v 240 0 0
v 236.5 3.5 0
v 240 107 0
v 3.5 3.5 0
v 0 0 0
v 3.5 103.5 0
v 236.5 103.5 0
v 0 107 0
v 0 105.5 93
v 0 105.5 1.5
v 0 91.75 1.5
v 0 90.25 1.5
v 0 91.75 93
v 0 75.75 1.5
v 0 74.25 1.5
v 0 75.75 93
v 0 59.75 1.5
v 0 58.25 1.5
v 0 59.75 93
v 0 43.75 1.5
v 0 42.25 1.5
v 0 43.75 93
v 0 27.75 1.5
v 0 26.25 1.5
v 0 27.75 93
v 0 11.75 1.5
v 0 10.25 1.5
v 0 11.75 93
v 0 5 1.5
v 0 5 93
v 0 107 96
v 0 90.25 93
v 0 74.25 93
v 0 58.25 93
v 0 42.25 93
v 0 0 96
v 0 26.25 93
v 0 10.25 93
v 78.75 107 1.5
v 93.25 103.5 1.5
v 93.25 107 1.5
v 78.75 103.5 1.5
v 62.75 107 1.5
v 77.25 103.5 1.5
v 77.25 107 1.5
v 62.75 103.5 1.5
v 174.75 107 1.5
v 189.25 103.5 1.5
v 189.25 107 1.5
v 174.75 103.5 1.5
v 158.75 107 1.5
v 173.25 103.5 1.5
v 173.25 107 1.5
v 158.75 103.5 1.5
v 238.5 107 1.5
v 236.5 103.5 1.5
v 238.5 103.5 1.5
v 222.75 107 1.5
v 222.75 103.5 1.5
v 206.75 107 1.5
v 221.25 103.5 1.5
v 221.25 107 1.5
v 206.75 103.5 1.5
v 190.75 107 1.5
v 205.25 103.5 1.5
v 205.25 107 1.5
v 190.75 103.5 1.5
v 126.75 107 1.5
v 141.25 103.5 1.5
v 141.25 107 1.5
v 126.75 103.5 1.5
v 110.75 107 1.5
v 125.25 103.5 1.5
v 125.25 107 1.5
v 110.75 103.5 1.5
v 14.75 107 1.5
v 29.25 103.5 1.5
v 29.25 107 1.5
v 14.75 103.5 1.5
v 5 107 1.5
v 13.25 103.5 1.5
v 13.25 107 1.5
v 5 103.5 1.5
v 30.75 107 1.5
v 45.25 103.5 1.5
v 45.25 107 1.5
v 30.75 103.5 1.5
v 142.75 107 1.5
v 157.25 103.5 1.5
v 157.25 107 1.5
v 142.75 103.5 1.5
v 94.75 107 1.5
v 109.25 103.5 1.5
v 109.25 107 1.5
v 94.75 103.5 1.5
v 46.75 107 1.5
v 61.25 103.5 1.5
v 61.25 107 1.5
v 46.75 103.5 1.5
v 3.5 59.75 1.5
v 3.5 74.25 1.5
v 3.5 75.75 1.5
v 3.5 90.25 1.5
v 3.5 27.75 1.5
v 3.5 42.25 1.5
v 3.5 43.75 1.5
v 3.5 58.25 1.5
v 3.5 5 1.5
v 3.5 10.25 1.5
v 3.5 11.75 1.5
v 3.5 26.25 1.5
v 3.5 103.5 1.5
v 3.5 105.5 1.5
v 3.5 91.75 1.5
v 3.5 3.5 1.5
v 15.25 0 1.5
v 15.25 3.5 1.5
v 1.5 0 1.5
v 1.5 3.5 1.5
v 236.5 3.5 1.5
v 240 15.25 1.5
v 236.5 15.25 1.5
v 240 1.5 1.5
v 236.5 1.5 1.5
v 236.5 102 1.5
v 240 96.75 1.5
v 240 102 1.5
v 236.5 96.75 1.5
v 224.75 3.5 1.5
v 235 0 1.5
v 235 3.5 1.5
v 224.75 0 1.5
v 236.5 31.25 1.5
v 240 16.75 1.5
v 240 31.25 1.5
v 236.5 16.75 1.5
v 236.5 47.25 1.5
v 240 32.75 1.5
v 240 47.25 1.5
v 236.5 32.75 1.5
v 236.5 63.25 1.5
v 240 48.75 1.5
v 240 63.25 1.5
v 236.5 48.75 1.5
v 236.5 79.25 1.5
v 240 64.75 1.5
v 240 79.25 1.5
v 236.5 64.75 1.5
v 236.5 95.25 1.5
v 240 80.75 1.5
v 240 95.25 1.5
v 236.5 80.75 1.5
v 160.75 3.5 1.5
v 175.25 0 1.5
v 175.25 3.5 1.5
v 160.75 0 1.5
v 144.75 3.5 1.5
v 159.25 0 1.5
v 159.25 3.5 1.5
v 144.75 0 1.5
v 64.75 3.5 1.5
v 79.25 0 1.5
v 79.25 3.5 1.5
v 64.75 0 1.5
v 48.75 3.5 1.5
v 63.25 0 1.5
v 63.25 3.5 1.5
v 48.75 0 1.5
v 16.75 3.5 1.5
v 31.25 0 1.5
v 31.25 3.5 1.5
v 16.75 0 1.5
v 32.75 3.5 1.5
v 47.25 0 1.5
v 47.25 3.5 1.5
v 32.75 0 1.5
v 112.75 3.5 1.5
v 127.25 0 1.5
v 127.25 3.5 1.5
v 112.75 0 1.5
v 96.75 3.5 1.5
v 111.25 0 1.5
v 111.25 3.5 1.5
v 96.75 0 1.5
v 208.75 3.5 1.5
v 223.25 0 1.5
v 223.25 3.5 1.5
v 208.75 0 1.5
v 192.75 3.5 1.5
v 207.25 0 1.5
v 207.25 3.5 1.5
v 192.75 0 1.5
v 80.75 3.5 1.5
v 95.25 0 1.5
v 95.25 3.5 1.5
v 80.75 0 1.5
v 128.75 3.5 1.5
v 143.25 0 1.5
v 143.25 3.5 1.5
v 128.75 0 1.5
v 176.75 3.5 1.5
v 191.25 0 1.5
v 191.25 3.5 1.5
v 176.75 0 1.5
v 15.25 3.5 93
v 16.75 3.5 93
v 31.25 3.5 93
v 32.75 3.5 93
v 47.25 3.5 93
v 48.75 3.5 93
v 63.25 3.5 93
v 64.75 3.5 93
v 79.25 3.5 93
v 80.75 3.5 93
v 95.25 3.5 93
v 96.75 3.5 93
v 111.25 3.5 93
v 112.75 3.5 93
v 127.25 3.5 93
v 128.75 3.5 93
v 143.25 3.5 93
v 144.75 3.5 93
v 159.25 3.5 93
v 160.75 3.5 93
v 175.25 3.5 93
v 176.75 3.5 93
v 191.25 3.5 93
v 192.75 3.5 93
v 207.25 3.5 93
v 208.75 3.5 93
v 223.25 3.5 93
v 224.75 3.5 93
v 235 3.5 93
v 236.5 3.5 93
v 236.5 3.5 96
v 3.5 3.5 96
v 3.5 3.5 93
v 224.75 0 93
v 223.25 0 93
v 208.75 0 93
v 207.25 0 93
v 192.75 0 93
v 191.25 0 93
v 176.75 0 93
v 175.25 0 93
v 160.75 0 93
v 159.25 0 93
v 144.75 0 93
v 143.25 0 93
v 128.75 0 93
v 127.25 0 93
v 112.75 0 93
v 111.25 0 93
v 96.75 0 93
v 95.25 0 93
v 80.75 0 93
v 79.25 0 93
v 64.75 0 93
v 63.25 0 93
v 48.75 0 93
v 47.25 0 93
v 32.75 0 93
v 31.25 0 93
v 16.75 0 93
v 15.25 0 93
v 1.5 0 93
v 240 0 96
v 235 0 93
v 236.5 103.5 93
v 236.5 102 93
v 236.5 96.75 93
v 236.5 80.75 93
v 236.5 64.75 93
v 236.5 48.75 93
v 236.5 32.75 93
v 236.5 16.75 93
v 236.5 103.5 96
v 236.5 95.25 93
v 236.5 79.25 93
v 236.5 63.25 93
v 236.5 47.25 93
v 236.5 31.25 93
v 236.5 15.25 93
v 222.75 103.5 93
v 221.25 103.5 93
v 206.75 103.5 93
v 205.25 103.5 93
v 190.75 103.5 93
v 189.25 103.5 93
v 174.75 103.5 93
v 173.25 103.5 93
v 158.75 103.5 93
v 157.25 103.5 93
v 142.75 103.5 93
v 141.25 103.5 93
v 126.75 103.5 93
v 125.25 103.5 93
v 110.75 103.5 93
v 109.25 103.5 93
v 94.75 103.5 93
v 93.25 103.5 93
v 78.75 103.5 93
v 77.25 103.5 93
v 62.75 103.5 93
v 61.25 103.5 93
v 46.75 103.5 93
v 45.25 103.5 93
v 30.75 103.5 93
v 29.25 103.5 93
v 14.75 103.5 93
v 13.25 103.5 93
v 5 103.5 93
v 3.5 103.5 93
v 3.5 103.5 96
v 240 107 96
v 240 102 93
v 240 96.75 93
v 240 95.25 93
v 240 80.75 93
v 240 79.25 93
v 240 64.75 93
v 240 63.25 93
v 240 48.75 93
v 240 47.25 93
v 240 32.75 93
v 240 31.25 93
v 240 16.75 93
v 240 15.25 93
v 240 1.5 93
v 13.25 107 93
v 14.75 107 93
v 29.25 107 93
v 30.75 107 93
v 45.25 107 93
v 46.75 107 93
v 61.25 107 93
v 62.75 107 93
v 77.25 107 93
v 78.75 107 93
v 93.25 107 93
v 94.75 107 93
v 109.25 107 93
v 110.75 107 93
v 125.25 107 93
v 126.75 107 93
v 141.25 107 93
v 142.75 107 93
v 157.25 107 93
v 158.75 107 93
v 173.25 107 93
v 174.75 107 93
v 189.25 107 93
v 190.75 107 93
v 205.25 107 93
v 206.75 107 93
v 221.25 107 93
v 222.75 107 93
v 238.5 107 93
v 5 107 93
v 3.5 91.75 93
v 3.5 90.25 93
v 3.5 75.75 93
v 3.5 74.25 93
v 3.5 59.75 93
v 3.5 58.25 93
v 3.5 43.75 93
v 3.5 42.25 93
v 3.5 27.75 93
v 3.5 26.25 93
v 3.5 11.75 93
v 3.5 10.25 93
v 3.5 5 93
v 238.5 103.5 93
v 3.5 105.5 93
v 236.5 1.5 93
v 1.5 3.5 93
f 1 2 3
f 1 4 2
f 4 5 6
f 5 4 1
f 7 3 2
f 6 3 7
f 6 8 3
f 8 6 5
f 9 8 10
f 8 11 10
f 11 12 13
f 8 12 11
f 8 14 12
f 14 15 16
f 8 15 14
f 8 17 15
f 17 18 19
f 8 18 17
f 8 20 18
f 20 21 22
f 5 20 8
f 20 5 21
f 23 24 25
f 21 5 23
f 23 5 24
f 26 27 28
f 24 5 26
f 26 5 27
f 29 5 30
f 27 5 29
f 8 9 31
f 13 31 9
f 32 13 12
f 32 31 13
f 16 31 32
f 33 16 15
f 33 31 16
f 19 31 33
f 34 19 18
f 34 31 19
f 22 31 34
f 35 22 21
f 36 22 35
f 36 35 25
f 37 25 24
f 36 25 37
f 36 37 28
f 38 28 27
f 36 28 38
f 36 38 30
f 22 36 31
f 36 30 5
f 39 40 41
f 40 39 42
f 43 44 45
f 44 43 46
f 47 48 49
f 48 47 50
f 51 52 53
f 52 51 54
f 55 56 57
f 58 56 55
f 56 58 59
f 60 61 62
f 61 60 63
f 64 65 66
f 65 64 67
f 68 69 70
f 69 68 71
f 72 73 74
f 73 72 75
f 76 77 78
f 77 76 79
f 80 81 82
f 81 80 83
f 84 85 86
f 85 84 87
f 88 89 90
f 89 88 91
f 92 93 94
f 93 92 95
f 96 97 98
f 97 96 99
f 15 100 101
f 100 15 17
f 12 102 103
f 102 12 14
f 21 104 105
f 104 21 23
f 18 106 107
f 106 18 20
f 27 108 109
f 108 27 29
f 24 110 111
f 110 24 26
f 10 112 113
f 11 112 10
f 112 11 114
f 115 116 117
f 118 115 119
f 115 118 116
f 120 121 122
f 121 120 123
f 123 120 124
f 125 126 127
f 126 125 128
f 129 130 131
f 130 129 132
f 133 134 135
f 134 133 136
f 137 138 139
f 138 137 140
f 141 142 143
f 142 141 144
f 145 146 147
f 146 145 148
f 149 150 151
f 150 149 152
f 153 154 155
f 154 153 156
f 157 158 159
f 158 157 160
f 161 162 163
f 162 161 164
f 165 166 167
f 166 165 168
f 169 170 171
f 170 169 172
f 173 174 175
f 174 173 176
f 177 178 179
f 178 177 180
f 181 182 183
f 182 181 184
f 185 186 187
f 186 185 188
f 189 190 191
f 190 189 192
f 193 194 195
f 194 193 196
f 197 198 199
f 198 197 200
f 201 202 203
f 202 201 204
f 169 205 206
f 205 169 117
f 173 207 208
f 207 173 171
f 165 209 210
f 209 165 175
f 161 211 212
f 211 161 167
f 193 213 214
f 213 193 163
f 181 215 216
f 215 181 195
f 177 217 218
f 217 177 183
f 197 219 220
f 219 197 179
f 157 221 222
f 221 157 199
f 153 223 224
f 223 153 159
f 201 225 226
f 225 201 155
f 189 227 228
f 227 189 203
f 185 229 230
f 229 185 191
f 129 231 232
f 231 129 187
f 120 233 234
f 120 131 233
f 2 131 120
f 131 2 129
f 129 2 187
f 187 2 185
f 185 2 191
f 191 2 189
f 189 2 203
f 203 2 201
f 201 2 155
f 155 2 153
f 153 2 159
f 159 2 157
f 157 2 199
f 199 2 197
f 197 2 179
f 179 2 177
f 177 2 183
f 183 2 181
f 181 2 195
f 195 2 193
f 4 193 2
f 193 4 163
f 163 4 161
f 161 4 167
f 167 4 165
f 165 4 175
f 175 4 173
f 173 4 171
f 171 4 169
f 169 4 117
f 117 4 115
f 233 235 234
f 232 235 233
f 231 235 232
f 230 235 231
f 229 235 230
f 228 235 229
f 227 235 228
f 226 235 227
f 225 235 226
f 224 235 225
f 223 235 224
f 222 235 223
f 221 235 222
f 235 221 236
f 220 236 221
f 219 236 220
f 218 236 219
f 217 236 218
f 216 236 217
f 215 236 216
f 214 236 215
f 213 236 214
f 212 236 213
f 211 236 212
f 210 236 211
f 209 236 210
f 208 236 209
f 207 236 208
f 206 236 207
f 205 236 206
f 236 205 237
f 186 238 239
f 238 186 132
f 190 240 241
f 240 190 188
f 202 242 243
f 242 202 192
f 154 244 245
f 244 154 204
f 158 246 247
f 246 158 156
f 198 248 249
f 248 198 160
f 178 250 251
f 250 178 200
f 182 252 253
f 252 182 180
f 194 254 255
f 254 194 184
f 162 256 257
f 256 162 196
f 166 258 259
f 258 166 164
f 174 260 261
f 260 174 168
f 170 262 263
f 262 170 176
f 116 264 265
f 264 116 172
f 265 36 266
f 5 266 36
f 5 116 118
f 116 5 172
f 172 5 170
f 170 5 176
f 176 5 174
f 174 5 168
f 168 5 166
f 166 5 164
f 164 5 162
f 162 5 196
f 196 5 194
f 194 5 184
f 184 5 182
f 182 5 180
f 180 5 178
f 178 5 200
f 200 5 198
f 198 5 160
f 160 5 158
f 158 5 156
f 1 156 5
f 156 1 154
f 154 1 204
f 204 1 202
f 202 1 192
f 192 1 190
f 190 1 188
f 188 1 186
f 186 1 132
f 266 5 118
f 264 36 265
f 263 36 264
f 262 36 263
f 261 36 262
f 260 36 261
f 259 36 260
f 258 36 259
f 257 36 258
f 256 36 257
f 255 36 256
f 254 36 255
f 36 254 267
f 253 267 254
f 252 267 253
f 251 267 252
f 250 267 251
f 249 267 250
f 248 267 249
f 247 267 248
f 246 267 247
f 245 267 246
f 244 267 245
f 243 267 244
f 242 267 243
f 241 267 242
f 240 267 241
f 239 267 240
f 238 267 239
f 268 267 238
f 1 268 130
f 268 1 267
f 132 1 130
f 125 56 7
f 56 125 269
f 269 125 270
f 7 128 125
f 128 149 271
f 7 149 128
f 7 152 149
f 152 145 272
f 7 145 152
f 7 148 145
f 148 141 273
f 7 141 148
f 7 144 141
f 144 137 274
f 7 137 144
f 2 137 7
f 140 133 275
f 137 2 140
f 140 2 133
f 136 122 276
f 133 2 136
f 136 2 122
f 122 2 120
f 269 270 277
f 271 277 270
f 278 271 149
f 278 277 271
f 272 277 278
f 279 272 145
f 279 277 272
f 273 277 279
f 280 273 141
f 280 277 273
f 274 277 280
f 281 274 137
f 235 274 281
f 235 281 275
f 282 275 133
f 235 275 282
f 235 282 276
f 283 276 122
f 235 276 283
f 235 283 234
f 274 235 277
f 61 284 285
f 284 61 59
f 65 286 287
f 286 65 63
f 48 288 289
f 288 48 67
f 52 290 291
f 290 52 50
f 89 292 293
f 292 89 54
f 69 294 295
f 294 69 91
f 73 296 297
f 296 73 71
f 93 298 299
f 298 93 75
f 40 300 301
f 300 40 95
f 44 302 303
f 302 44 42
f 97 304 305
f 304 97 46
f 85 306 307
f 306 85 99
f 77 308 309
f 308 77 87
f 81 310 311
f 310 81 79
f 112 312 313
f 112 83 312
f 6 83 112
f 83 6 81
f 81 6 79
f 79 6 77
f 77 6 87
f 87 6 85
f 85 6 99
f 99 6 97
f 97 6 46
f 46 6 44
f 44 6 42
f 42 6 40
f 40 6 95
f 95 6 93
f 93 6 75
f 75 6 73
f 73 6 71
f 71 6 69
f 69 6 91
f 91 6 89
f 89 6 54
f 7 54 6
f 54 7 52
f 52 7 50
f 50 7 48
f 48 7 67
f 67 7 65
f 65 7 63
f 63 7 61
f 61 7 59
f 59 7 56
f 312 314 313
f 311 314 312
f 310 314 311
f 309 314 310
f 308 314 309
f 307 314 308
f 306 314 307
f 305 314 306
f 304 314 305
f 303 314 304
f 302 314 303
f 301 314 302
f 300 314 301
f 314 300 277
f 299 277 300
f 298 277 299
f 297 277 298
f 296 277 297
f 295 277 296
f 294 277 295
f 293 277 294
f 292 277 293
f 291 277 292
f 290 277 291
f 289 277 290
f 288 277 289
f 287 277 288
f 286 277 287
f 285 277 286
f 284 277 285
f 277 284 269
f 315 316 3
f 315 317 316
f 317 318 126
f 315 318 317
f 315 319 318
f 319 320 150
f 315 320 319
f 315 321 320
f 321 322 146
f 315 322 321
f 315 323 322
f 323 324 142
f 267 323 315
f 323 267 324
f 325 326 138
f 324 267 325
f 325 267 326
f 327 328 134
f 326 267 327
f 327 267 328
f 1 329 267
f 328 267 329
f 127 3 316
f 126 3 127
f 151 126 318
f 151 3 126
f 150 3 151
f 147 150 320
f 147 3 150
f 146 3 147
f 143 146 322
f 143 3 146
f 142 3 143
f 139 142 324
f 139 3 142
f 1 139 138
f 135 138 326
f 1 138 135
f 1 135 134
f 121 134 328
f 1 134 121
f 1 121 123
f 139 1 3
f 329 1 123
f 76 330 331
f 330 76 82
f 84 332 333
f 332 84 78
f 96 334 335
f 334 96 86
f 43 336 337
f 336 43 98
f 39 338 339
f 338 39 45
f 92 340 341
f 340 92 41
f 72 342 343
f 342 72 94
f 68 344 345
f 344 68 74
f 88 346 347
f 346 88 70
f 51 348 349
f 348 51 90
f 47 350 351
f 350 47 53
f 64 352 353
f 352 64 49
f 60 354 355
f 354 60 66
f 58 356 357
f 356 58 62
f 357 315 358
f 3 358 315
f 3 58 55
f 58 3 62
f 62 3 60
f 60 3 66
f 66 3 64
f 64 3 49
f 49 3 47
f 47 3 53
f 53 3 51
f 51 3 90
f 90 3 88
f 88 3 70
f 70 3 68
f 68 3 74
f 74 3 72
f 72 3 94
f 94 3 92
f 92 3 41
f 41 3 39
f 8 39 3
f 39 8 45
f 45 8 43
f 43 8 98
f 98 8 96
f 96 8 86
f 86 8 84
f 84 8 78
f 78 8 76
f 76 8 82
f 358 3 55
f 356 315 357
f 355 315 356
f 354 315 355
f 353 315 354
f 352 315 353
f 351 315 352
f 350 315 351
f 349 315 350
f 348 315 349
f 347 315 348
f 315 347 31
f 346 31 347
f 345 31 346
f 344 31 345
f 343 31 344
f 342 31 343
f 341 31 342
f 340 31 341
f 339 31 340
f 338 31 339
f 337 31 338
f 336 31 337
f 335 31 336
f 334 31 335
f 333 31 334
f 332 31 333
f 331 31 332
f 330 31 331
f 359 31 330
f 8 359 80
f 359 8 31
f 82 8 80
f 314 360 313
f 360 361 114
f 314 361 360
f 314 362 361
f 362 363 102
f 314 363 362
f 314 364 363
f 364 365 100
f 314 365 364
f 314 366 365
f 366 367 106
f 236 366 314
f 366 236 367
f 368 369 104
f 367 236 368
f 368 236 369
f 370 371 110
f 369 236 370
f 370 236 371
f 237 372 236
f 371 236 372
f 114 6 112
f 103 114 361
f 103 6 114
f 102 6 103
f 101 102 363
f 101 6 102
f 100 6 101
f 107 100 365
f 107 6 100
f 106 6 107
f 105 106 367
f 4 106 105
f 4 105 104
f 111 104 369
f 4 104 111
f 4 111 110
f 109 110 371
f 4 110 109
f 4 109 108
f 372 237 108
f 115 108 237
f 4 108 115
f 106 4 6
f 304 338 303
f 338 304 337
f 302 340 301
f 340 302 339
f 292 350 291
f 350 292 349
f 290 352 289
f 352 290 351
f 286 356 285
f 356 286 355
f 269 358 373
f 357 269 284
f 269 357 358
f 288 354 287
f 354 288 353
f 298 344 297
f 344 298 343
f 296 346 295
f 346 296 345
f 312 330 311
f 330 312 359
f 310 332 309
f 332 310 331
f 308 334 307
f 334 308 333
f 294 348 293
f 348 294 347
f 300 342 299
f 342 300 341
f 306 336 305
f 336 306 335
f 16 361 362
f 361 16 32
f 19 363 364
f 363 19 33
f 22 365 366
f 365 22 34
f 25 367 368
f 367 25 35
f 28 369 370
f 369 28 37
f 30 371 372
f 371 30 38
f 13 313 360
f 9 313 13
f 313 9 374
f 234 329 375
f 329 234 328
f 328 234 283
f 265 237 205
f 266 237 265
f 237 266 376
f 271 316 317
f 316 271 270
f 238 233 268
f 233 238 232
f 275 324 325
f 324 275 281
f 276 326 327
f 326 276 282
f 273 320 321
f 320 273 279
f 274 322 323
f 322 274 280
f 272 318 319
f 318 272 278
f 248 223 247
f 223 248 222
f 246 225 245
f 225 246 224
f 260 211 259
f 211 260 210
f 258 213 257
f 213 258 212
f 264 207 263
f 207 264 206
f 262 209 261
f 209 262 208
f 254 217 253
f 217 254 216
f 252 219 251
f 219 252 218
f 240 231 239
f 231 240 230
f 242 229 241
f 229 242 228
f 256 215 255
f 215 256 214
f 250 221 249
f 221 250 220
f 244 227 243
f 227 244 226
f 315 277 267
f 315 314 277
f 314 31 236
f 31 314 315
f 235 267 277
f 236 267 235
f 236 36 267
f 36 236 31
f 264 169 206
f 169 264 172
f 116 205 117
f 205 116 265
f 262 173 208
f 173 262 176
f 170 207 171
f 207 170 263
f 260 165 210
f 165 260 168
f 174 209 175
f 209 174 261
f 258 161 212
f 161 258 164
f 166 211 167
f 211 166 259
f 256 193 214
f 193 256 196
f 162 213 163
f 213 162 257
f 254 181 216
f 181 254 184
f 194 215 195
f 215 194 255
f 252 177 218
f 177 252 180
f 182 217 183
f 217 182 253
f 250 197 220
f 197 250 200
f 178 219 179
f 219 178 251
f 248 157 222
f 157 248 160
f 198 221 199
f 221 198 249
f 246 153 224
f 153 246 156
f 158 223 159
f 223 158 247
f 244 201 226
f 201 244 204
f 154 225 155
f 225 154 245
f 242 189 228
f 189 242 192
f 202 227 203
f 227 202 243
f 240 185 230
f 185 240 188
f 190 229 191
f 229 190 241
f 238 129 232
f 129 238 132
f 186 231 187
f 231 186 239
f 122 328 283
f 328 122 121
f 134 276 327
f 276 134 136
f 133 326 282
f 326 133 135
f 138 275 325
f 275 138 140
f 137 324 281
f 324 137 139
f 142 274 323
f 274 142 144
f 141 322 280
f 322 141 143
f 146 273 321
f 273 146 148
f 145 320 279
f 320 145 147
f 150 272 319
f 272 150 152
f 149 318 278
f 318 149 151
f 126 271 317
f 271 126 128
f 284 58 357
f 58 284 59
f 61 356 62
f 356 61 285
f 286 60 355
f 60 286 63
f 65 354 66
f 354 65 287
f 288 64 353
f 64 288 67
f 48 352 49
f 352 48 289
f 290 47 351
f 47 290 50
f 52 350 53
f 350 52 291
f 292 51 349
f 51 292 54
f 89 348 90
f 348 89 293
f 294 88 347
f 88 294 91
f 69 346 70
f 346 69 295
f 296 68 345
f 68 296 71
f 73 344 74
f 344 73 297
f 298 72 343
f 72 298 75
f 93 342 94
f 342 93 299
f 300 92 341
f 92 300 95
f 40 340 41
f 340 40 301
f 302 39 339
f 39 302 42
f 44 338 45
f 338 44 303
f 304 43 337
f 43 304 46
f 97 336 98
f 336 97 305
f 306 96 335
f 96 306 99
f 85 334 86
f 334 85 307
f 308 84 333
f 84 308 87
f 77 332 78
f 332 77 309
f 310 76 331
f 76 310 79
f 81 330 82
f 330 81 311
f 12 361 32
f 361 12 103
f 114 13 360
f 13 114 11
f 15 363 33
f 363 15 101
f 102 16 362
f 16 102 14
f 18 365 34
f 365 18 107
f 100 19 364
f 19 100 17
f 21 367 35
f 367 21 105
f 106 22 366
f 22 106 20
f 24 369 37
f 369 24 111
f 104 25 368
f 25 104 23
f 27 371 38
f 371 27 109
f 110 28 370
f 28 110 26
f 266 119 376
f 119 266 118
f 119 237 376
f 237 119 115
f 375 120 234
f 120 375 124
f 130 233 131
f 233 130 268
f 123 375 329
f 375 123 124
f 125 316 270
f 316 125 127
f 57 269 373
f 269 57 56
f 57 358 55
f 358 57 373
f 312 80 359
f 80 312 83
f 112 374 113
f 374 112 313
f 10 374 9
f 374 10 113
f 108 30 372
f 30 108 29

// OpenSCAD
// file: lumber.scad
use <utilities.scad>;

// Stick
module stick_2x4x8(cut = [0, 0, 0]) {
  echo("stick_2x4x8");
  cube([inches(1, 1 / 2) - cut[0], inches(3, 1 / 2) - cut[1], feet(8) - cut[2]]);
}
;

module stick_2x6x8(cut = [0, 0, 0]) {
  echo("stick_2x6x8");
  cube([inches(1, 1 / 2) - cut[0], inches(5, 1 / 2) - cut[1], feet(8) - cut[2]]);
}
;

// Sheet
module stick_4x8x1_2(cut = [0, 0, 0]) {
  echo("4x8x1/2");
  cube([feet(4) - cut[0], feet(8) - cut[1], inches(0, 1 / 2) - cut[2]]);
}
;

module stick_4x8x3_4(cut = [0, 0, 0]) {
  echo("4x8x3/4");
  cube([feet(4) - cut[0], feet(8) - cut[1], inches(0, 3 / 4) - cut[2]]);
}
;

stick_2x4x8();

translate([24, 0, 0])
  stick_2x6x8();

translate([48, 0, 0])
  stick_4x8x1_2();

translate([120, 0, 0])
  stick_4x8x3_4();
// file: utilities.scad
function feet(f) = f * 12;
function inches(i = 0, f = 0) = i + f;
// main file
use <utilities.scad>;
use <lumber.scad>;

module frame_walls(start_height = 0, wall_height = feet(8), width = feet(20), depth = feet(8) + inches(11)) {
  stud_cut_length = feet(8) - wall_height + inches(4, 1 / 2);
  assert(stud_cut_length > -0.00000000001, "Your wall height has exceeded your lumber length");

  for (a = [0:1]) {
    // Top and Bottom Plate
    // South Plates
    for (b = [0:feet(8):width]) {
      trim = b + feet(8) > width ? [0, 0, b + feet(8) - width + inches(3, 1 / 2)] : [0, 0, 0];

      translate([b, 0, inches(1, 1 / 2) + start_height + a * (wall_height - inches(3))])
        rotate(a=[0, 90, 0])
          stick_2x4x8(cut=trim);
    }

    // Add a second top plate
    if (a == 1) {
      for (b = [width:-feet(8):0]) {
        echo("b:", b); trim = b < feet(8) ? [0, 0, feet(8) - b + inches(3, 1 / 2)] : [0, 0, 0];

        translate([b - feet(8) + trim[2], 0, a * wall_height + start_height])
          rotate(a=[0, 90, 0])
            stick_2x4x8(cut=trim);
      }
    }

    // East Plates
    for (b = [0:feet(8):depth]) {
      // near to far
      translate([width, 0, inches(1, 1 / 2) + start_height + a * (wall_height - inches(3))])
        rotate(a=[270, 90, 0])
          stick_2x4x8(cut=[0, 0, feet(8) - depth + inches(3, 1 / 2)]);
    }

    // Add a second top plate
    if (a == 1) {
      for (b = [0:feet(8):depth]) {
        // near to far
        translate([width, inches(3, 1 / 2), a * wall_height + start_height])
          rotate(a=[270, 90, 0])
            stick_2x4x8(cut=[0, 0, feet(8) - depth + inches(3, 1 / 2)]);
      }
    }

    // North Plates
    for (b = [width:-feet(8):0]) {
      // Right to left
      trim = b < feet(8) ? [0, 0, feet(8) - b + 3.5] : [0, 0, 0];

      translate([b, depth - inches(3, 1 / 2), a * (wall_height - inches(3))])
        rotate(a=[0, 270, 0])
          stick_2x4x8(cut=trim);
    }

    // Add a second top plate
    if (a == 1) {
      for (b = [0:feet(8):width]) {
        // Right to left
        trim = width - b < feet(8) ? [0, 0, feet(8) - (width - b) + inches(3, 1 / 2)] : [0, 0, 0];

        translate([b, depth - inches(3, 1 / 2), a * wall_height + start_height])
          rotate(a=[0, 90, 0])
            stick_2x4x8(cut=trim);
      }
    }

    // West Plates
    for (b = [0:feet(8):depth]) {
      // near to far
      translate([0, depth, inches(1, 1 / 2) + start_height + a * (wall_height - inches(3))])
        rotate(a=[90, 90, 0])
          stick_2x4x8(cut=[0, 0, feet(8) - depth + inches(3, 1 / 2)]);
    }

    // Add a second top plate
    if (a == 1) {
      for (b = [0:feet(8):depth]) {
        // near to far
        translate([0, depth - inches(3, 1 / 2), a * wall_height + start_height])
          rotate(a=[90, 90, 0])
            stick_2x4x8(cut=[0, 0, feet(8) - depth + inches(3, 1 / 2)]);
      }
    }
  }

  // South Wall
  translate([0, 0, inches(1, 1 / 2) + start_height])
    stick_2x4x8(cut=[0, 0, stud_cut_length]);

  let (stud_placement = [for (i = [inches(15, 1 / 4):inches(16):width - inches(1, 1 / 2)]) i]) {
    // Switch to specific studs when we add window and door framing
    for (stud = stud_placement) {
      translate([stud, 0, inches(1, 1 / 2) + start_height])
        stick_2x4x8(cut=[0, 0, stud_cut_length]);
    }
  }

  translate([width - inches(5), 0, inches(1, 1 / 2) + start_height])
    stick_2x4x8(cut=[0, 0, stud_cut_length]);

  // East Wall
  translate([width - inches(3, 1 / 2), inches(1, 1 / 2), inches(1, 1 / 2) + start_height])
    rotate(a=[0, 0, 270])
      stick_2x4x8(cut=[0, 0, stud_cut_length]);

  let (stud_placement = [for (i = [inches(15, 1 / 4):inches(16):depth - inches(1, 1 / 2)]) i]) {
    // Switch to specific studs when we add window and door framing
    for (stud = stud_placement) {
      translate([width - inches(3, 1 / 2), inches(1, 1 / 2) + stud, inches(1, 1 / 2) + start_height])
        rotate(a=[0, 0, 270])
          stick_2x4x8(cut=[0, 0, stud_cut_length]);
    }
  }

  translate([width - inches(3, 1 / 2), depth - inches(3, 1 / 2), inches(1, 1 / 2) + start_height])
    rotate(a=[0, 0, 270])
      stick_2x4x8(cut=[0, 0, stud_cut_length]);

  // North Wall
  translate([width - inches(1, 1 / 2), depth - inches(3, 1 / 2), inches(1, 1 / 2) + start_height])
    stick_2x4x8(cut=[0, 0, stud_cut_length]);

  let (stud_placement = [for (i = [inches(15, 1 / 4):inches(16):width - inches(1, 1 / 2)]) i]) {
    // Switch to specific studs when we add window and door framing
    for (stud = stud_placement) {
      translate([width - inches(3, 1 / 2) - stud, depth - inches(3, 1 / 2), inches(1, 1 / 2) + start_height])
        stick_2x4x8(cut=[0, 0, stud_cut_length]);
    }
  }

  translate([inches(3, 1 / 2), depth - inches(3, 1 / 2), inches(1, 1 / 2) + start_height])
    stick_2x4x8(cut=[0, 0, stud_cut_length]);

  // West Wall
  translate([0, depth, inches(1, 1 / 2) + start_height])
    rotate(a=[0, 0, 270])
      stick_2x4x8(cut=[0, 0, stud_cut_length]);

  let (stud_placement = [for (i = [inches(15, 1 / 4):inches(16):depth - inches(1, 1 / 2)]) i]) {
    // Switch to specific studs when we add window and door framing
    for (stud = stud_placement) {
      translate([0, depth - stud, inches(1, 1 / 2) + start_height])
        rotate(a=[0, 0, 270])
          stick_2x4x8(cut=[0, 0, stud_cut_length]);
    }
  }

  translate([0, inches(5), inches(1, 1 / 2) + start_height])
    rotate(a=[0, 0, 270])
      stick_2x4x8(cut=[0, 0, stud_cut_length]);
}

frame_walls();
